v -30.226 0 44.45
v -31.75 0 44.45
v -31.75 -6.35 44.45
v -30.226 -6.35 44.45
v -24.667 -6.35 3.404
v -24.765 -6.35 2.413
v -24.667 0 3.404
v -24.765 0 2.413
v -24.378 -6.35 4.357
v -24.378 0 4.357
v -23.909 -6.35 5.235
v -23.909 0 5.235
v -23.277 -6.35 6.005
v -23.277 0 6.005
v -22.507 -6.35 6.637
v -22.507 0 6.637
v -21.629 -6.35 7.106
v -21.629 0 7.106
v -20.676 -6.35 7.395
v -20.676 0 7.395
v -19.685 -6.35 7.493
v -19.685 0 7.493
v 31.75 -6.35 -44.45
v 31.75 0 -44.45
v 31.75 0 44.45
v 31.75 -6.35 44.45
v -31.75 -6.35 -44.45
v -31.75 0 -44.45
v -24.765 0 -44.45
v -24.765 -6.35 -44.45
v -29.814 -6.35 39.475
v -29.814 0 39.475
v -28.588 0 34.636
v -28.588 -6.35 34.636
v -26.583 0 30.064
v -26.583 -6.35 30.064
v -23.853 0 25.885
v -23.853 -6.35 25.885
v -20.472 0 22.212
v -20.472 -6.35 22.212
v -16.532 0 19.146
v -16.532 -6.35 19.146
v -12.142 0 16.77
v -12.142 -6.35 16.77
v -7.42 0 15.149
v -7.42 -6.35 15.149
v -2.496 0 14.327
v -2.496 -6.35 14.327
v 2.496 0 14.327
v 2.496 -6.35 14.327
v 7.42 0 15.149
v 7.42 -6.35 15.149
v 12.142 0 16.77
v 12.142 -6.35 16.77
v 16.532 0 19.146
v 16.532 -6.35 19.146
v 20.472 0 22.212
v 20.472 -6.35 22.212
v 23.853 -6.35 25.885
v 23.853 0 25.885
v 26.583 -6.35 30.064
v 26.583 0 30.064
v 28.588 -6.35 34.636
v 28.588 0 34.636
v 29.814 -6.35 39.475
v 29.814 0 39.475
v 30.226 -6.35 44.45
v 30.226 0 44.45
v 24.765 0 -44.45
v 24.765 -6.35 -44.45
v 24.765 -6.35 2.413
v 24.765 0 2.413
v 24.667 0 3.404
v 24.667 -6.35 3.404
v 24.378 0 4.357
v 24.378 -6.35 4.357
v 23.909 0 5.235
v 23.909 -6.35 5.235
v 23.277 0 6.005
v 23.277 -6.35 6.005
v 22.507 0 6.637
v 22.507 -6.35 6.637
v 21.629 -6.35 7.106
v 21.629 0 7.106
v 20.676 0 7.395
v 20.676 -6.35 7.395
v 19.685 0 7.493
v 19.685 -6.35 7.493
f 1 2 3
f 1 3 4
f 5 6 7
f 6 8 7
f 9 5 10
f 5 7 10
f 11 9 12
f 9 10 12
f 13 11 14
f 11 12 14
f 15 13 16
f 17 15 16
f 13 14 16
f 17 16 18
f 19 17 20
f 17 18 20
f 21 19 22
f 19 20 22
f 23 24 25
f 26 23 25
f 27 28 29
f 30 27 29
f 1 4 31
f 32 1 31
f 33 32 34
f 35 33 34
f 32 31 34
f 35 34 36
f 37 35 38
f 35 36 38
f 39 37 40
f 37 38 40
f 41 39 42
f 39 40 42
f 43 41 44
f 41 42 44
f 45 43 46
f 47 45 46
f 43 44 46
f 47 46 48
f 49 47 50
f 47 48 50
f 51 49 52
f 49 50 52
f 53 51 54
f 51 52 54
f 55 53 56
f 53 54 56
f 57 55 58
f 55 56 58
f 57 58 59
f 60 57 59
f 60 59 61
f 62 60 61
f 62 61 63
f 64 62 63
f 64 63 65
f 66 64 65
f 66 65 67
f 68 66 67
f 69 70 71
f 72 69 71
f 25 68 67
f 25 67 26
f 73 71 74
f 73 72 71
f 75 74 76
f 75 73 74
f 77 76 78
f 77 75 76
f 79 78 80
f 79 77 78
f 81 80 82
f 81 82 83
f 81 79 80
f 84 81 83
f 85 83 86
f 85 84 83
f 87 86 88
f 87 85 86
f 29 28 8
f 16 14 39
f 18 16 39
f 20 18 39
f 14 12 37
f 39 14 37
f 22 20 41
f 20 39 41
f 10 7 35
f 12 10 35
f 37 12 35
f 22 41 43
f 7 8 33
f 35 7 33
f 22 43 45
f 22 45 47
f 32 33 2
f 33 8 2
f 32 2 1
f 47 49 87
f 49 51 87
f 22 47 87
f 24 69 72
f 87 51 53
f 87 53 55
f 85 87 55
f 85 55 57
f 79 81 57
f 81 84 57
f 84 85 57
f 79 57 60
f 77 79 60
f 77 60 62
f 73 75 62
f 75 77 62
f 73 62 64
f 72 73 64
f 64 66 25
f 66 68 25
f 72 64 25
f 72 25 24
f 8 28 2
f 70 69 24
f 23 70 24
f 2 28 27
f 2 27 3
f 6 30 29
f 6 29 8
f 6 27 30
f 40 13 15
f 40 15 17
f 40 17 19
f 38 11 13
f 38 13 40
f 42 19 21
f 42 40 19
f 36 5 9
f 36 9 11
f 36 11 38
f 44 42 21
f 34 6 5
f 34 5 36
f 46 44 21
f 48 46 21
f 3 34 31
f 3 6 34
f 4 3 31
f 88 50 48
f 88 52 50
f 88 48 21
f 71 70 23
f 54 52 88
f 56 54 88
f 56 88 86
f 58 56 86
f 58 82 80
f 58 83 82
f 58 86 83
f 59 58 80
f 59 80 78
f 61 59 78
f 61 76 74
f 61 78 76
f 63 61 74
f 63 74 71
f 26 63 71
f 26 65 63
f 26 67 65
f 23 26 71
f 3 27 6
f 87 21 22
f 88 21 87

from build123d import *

# Parameters (mm, degrees)
F0_W     = 63.5
F0_H     = 88.9
F1_DEPTH = 6.35
F2_R     = 30.226
F3_DEPTH = 6.351
F4_W     = 49.529999
F4_H     = 51.943
F5_DEPTH = 6.351
F6_R     = 5.08


with BuildPart() as f1:
    # F0 (on Front) → F1 (new body)
    with BuildSketch(Plane.XZ):
        Rectangle(F0_W, F0_H)
    extrude(amount=F1_DEPTH)

    # F2 (on face) → F3 (cut, through all)
    with BuildSketch(Plane.XZ.offset(6.35)):
        with Locations((0, 44.45)):
            Circle(F2_R)
    extrude(amount=-F3_DEPTH, mode=Mode.SUBTRACT)

    # F4 (on face) → F5 (cut, through all)
    with BuildSketch(Plane.XZ.offset(6.35)):
        with Locations((-1e-06, -18.4785)):
            Rectangle(F4_W, F4_H)
    extrude(amount=-F5_DEPTH, mode=Mode.SUBTRACT)

    # F6
    f6_edges = [f1.edges().sort_by_distance(p)[0] for p in [
        (-24.765, -3.175, 7.493),
        (24.764999, -3.175, 7.493),
    ]]
    fillet(f6_edges, radius=F6_R)


solid = f1.part
